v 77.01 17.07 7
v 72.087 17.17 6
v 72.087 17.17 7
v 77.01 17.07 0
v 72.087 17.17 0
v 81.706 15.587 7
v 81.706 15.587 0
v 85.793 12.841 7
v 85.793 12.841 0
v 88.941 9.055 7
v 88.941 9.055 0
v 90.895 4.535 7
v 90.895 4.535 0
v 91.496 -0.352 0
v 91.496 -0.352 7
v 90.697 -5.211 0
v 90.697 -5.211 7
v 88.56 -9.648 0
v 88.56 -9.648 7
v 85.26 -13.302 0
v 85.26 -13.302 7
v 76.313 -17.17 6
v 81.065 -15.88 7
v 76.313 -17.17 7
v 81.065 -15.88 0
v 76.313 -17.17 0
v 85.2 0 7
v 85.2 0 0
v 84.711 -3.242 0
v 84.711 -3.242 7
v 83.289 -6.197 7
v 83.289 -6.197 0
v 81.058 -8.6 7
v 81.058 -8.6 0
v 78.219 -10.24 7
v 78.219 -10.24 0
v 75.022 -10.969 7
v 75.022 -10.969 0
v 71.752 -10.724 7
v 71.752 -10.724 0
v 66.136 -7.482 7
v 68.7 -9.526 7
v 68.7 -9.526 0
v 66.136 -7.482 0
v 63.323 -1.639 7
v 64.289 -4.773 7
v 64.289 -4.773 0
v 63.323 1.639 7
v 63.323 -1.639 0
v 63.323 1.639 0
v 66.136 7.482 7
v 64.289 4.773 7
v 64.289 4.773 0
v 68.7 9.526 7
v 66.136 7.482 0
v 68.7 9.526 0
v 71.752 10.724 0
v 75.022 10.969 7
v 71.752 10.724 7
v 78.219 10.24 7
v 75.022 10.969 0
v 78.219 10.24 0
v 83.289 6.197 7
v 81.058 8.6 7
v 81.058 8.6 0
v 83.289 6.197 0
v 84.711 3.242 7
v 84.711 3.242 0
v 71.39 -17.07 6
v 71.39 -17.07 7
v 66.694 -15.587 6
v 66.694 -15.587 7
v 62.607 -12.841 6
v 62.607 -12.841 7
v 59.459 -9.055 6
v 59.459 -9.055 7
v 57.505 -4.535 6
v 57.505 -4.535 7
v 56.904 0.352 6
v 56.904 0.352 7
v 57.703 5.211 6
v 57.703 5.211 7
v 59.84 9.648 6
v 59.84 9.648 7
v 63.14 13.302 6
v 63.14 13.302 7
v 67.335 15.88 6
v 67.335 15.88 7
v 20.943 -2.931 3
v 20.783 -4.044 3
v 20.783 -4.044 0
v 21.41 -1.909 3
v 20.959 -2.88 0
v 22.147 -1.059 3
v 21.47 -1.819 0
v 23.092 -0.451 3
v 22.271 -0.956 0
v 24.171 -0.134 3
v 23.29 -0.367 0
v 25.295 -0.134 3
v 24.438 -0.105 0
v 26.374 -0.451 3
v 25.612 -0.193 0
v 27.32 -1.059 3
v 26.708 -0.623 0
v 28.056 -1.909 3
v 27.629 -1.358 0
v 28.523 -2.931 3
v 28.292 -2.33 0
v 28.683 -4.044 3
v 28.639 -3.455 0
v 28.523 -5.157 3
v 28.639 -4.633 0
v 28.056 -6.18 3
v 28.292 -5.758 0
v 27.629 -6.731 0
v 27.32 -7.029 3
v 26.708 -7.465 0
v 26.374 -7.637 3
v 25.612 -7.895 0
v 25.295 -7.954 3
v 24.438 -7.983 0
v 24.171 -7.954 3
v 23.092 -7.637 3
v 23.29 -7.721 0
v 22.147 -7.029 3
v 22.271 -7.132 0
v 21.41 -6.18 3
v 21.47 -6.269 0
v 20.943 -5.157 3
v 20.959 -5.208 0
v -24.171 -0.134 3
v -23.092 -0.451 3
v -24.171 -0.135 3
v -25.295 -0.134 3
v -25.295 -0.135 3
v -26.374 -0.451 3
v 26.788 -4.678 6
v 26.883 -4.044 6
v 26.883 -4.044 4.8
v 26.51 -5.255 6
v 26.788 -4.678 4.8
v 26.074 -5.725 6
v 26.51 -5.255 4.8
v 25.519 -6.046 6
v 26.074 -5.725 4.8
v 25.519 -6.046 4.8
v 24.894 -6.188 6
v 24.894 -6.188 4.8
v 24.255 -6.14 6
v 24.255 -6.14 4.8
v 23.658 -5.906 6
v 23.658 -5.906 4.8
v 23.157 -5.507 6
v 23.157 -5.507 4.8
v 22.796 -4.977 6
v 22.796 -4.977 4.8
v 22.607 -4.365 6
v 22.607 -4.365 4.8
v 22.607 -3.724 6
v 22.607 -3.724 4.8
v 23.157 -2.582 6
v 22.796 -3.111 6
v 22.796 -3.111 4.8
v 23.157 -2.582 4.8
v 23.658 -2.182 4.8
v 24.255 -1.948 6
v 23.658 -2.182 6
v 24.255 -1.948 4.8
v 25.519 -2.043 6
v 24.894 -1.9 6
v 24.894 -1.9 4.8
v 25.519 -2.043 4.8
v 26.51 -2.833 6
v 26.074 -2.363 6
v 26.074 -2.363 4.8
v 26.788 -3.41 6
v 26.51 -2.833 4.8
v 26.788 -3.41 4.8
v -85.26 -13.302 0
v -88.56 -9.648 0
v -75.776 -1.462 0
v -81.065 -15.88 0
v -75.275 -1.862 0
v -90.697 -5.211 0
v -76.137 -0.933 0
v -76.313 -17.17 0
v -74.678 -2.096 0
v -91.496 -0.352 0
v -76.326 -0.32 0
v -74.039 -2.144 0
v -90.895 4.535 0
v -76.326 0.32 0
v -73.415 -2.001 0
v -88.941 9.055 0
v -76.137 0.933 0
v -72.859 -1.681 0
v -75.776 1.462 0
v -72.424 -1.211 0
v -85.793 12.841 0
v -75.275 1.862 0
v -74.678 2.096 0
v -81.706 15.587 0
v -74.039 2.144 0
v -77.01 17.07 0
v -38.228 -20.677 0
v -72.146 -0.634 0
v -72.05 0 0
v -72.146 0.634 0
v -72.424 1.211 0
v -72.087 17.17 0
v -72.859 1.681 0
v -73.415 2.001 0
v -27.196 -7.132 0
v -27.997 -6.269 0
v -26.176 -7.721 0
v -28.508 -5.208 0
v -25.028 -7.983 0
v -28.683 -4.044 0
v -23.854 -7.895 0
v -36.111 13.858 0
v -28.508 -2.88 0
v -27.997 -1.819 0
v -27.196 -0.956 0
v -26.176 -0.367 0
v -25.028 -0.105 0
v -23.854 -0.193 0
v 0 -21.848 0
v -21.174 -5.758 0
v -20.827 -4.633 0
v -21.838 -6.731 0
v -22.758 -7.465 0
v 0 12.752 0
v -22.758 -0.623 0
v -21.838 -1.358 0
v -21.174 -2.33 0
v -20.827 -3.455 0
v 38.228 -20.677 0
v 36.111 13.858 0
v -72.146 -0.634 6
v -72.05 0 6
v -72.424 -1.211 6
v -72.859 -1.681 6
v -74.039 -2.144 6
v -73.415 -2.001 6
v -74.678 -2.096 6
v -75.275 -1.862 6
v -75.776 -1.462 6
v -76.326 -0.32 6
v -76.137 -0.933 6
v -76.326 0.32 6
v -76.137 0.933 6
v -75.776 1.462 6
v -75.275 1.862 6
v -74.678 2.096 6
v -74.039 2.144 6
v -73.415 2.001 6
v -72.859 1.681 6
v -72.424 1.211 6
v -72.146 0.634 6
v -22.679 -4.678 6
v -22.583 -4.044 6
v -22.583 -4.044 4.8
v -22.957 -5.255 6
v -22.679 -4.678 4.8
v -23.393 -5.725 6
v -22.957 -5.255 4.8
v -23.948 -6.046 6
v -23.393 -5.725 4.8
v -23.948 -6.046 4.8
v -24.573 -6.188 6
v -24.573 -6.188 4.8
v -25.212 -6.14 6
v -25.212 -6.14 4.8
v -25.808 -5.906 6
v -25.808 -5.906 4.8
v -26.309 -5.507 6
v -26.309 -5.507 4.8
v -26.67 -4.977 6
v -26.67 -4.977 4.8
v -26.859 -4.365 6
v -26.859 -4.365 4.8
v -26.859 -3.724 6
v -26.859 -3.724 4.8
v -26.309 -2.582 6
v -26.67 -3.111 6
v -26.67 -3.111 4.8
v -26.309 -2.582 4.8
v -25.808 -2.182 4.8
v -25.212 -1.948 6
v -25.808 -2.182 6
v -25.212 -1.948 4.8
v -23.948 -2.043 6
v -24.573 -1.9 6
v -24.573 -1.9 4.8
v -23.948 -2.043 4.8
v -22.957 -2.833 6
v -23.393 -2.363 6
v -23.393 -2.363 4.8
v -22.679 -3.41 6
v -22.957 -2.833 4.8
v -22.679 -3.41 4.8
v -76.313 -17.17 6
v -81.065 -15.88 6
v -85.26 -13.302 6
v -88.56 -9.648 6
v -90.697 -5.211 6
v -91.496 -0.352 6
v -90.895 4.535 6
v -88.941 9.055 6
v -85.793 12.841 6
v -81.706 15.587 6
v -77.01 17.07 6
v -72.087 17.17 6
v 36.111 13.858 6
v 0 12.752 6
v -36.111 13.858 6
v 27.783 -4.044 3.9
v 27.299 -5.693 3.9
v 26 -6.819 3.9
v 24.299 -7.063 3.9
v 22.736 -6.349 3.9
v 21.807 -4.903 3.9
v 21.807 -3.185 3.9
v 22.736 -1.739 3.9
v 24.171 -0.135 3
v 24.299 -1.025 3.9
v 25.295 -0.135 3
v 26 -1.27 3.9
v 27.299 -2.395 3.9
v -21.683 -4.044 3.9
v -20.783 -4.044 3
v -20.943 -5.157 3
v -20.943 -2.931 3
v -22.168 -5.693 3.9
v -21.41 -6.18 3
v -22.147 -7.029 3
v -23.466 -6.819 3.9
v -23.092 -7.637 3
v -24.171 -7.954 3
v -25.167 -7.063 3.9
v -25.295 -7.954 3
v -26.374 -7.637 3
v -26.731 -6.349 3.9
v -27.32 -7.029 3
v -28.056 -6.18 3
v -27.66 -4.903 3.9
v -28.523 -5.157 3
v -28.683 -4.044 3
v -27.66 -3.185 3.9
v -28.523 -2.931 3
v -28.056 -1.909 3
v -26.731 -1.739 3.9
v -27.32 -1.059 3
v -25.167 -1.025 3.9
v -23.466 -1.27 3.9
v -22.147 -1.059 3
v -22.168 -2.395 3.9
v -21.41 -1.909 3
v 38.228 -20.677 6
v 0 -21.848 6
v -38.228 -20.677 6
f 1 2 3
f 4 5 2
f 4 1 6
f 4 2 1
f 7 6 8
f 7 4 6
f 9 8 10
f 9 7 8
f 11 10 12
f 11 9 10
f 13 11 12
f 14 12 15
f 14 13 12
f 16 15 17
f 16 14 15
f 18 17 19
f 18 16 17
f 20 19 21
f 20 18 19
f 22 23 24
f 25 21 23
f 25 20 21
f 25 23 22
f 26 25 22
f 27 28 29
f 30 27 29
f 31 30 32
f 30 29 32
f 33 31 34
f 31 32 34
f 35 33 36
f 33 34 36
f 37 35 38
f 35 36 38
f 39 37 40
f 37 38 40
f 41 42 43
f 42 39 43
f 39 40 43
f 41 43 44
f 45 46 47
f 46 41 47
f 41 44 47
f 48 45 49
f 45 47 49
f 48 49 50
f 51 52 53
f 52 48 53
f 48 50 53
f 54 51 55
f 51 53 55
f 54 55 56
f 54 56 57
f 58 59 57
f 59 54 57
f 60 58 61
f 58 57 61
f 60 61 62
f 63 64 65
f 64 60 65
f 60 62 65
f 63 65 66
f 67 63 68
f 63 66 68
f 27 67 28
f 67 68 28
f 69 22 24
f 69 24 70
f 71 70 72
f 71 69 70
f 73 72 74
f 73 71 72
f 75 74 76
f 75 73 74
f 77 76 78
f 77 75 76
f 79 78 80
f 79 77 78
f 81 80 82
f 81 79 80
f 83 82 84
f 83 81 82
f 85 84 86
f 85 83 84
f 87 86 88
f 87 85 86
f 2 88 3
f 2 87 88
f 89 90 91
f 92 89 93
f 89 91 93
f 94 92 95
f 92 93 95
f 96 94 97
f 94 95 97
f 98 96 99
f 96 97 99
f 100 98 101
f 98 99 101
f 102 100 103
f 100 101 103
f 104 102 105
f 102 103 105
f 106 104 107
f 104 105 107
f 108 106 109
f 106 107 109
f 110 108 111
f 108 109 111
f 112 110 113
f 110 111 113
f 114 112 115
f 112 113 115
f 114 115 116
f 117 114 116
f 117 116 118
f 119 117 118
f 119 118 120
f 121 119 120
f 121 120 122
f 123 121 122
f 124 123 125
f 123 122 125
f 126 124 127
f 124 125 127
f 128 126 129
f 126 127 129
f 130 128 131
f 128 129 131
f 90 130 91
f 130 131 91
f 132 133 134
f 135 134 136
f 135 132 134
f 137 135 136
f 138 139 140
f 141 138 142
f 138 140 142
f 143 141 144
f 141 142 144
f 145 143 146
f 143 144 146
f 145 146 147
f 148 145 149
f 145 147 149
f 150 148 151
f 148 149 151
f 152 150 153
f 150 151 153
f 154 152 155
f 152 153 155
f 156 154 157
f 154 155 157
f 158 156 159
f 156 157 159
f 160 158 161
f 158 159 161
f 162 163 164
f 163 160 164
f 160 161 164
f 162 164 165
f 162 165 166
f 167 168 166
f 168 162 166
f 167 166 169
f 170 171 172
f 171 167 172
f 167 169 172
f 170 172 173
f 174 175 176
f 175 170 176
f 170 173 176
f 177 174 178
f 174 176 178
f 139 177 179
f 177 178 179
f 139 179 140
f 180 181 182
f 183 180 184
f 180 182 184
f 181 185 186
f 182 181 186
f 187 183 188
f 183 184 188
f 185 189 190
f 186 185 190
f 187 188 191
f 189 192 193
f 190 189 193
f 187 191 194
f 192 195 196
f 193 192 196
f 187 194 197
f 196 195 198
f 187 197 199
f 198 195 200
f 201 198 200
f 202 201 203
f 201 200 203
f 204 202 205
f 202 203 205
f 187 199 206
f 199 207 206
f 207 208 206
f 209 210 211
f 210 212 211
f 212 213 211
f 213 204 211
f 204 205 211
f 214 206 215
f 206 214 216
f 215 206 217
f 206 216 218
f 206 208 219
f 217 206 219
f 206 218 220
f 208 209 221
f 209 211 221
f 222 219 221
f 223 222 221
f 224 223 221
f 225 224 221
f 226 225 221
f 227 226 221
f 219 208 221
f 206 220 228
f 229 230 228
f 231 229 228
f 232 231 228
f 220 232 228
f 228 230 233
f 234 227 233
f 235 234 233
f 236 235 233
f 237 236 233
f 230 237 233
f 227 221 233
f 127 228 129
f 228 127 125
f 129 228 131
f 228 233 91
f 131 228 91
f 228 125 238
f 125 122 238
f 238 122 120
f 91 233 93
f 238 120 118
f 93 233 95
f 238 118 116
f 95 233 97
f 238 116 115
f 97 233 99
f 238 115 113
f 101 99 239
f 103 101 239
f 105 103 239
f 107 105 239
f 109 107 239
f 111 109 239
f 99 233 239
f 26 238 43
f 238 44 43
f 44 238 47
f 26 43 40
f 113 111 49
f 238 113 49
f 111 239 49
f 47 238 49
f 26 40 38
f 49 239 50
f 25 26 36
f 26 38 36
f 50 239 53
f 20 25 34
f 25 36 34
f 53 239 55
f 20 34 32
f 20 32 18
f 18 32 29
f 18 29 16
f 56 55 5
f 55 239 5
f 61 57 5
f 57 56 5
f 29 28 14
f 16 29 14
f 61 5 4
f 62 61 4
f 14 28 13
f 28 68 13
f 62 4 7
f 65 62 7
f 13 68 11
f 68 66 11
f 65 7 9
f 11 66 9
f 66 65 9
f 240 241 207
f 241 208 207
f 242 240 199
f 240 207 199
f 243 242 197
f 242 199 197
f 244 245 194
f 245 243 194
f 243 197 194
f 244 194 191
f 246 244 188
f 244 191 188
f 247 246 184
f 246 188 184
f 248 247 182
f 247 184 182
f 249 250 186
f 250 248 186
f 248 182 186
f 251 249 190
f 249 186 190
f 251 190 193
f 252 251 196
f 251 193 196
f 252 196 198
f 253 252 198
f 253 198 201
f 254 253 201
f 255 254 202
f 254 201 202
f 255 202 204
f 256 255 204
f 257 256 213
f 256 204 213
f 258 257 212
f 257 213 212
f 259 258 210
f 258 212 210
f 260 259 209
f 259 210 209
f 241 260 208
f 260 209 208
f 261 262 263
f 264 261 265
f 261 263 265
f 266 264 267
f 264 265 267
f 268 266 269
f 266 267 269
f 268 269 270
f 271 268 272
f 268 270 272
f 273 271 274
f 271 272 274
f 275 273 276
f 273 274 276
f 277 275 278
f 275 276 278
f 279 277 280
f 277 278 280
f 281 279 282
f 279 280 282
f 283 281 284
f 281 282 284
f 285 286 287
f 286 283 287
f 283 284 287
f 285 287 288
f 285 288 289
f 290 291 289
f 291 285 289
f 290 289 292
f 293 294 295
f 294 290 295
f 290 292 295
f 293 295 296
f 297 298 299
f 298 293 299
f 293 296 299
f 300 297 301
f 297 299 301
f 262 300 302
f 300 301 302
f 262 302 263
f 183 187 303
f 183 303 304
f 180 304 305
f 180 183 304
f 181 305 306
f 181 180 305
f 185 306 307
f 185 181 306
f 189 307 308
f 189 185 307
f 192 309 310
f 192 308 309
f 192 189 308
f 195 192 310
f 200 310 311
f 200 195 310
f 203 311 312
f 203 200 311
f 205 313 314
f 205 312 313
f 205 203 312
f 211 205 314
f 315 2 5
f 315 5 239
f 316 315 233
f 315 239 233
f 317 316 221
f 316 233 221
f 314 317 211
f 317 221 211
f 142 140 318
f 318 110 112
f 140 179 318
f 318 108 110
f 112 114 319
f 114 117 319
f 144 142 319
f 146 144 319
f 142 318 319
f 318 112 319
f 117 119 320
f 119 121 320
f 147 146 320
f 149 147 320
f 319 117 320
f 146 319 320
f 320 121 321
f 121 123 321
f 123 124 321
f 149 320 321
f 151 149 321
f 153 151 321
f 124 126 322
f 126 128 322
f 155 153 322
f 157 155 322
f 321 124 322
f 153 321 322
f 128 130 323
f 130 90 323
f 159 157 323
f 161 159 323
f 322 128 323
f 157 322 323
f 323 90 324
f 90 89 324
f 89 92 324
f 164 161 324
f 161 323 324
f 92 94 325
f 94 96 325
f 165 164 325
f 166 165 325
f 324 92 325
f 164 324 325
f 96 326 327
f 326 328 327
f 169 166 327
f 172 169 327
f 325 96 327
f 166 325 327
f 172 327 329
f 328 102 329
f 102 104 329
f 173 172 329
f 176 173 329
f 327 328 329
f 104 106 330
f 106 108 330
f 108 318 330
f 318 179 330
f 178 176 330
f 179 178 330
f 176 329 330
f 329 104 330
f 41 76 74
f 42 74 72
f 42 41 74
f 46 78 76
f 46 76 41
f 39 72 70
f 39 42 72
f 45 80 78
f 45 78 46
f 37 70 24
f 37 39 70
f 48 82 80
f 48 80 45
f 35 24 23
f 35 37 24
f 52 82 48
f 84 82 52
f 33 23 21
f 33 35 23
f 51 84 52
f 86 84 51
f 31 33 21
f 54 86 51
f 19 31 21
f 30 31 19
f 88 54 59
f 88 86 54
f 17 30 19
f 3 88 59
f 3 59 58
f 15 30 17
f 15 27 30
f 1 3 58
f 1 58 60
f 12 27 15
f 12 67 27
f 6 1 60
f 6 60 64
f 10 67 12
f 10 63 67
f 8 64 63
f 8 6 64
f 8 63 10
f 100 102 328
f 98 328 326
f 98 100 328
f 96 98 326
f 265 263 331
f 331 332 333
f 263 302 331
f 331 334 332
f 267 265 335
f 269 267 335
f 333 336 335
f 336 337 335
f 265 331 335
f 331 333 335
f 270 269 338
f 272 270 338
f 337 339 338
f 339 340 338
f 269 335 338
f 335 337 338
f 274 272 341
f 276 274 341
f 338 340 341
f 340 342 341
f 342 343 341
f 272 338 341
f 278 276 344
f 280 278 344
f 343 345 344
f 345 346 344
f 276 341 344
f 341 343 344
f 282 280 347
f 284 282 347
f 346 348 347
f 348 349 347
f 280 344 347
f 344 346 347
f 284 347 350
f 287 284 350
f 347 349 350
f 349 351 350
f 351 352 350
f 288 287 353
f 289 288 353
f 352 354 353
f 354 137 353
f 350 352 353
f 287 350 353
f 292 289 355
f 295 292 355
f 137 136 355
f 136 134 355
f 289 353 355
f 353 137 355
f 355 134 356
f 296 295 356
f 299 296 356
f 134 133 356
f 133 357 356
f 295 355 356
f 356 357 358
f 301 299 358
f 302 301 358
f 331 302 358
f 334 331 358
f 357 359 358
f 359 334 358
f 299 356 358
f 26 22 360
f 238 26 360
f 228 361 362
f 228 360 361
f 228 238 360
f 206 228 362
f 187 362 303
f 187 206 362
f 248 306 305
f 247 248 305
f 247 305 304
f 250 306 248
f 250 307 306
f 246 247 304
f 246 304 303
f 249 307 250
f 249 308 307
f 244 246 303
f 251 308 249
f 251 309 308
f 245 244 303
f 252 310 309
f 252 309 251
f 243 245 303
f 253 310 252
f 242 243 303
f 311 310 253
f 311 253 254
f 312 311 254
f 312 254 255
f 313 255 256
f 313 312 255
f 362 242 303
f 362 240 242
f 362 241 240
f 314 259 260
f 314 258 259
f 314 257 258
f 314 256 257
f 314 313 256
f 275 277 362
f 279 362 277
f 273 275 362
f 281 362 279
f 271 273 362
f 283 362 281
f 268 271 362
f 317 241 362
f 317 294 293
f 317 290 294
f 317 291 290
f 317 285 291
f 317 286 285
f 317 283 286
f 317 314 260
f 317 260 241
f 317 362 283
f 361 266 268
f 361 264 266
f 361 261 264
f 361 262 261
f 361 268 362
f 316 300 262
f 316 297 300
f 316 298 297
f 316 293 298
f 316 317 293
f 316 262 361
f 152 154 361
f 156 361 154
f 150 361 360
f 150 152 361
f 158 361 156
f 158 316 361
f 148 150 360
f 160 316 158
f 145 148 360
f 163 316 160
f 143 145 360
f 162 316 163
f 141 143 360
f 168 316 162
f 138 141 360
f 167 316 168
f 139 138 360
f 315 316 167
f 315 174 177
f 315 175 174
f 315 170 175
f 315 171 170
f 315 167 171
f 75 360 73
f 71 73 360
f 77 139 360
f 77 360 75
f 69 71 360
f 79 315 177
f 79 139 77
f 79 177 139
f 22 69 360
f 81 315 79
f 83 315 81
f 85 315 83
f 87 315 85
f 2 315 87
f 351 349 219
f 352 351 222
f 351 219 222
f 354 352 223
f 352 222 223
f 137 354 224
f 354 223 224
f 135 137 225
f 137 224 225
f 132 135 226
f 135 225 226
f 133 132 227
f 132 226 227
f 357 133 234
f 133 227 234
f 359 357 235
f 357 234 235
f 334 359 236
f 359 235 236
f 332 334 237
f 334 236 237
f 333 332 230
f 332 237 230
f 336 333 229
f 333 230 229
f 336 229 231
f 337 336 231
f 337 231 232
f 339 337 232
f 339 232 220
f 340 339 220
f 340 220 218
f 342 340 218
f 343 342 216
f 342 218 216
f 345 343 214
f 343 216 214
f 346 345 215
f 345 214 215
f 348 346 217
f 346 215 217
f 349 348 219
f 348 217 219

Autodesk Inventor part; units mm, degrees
ref_plane "YZ Plane" through (0, 0, 0) normal (1, 0, 0) x (0, 1, 0)
ref_plane "XZ Plane" through (0, 0, 0) normal (0, 1, 0) x (-1, 0, 0)
ref_plane "XY Plane" through (0, 0, 0) normal (0, 0, 1) x (1, 0, 0)
sketch "Sketch1" plane through (0, 0, 0) normal (0, 0, 1) x (1, 0, 0)
  arc A0 (-74.2, 0) -> (74.2, 0) centre (0, 603.0231) ccw construction
  arc A1 (-76.3128, -17.1705) -> (76.3128, -17.1705) centre (0, 603.0231) ccw
  arc A2 (-72.0872, 17.1705) -> (72.0872, 17.1705) centre (0, 603.0231) ccw
  arc A3 (-72.0872, 17.1705) -> (-76.3128, -17.1705) centre (-74.2, 0) ccw
  arc A4 (76.3128, -17.1705) -> (72.0872, 17.1705) centre (74.2, 0) ccw
  line L0 (-159.9202, 0) -> (186.0645, 0) construction
  line L1 (0, 827.4607) -> (0, -503.7998) construction
  line L2 (74.2, 0) -> (74.2, 0) construction
  line L3 (74.2, 0) -> (91.3705, 2.1128) construction
  line L4 (74.2, 0) -> (72.0872, 17.1705) construction
  circle A5 centre (-74.2, 0) radius 2.15
  circle A6 centre (-24.7333, -4.0442) radius 2.15
  circle A7 centre (24.7333, -4.0442) radius 2.15
  circle A8 centre (74.2, 0) radius 11
  point P0 (0, 0)
  dimension "d0" = 148.4
  dimension "d1" = 34.6
  dimension "d2" = 603.0231
  dimension "d6" = 49.4667
  dimension "d7" = 24.7333
  dimension "d8" = 4.3
  dimension "d9" = 4.3
  dimension "d10" = 4.3
  dimension "d12" = 22
extrude "Extrusion1" add sketch "Sketch1" along normal blind 6
sketch "Sketch2" plane through (0, 0, 6) normal (0, 0, 1) x (1, 0, 0)
  circle A0 centre (74.2, 0) radius 11 projected
  arc A1 (76.3128, -17.1705) -> (72.0872, 17.1705) centre (74.2, 0) ccw projected
  arc A2 (-76.3128, -17.1705) -> (76.3128, -17.1705) centre (0, 603.0231) ccw projected
  circle A3 centre (74.2, 0) radius 17.3
  point P0 (0, 0)
extrude "Extrusion2" add sketch "Sketch2" along normal blind 1
sketch "Sketch3" plane through (0, 0, 0) normal (0, 0, -1) x (-1, 0, 0)
  circle A0 centre (-24.7333, -4.0442) radius 2.15 projected
  circle A1 centre (-24.7333, -4.0442) radius 3.95
  circle A2 centre (24.7333, -4.0442) radius 2.15 projected
  circle A3 centre (24.7333, -4.0442) radius 3.95
  point P0 (0, 0)
  dimension "d19" = 7.9
  dimension "d20" = 7.9
extrude "Extrusion3" cut sketch "Sketch3" against normal blind 3
chamfer "Chamfer1" distance 1.8 angle 45 2 edges at (22.5833, -4.0442, 3) (-26.8833, -4.0442, 3)
equation "\"d6\" = 0.333333 * d0"
equation "\"d7\" = 0.5 * d6"
equation "\"d20\" = d19"
properties part number "Arm 16X"
